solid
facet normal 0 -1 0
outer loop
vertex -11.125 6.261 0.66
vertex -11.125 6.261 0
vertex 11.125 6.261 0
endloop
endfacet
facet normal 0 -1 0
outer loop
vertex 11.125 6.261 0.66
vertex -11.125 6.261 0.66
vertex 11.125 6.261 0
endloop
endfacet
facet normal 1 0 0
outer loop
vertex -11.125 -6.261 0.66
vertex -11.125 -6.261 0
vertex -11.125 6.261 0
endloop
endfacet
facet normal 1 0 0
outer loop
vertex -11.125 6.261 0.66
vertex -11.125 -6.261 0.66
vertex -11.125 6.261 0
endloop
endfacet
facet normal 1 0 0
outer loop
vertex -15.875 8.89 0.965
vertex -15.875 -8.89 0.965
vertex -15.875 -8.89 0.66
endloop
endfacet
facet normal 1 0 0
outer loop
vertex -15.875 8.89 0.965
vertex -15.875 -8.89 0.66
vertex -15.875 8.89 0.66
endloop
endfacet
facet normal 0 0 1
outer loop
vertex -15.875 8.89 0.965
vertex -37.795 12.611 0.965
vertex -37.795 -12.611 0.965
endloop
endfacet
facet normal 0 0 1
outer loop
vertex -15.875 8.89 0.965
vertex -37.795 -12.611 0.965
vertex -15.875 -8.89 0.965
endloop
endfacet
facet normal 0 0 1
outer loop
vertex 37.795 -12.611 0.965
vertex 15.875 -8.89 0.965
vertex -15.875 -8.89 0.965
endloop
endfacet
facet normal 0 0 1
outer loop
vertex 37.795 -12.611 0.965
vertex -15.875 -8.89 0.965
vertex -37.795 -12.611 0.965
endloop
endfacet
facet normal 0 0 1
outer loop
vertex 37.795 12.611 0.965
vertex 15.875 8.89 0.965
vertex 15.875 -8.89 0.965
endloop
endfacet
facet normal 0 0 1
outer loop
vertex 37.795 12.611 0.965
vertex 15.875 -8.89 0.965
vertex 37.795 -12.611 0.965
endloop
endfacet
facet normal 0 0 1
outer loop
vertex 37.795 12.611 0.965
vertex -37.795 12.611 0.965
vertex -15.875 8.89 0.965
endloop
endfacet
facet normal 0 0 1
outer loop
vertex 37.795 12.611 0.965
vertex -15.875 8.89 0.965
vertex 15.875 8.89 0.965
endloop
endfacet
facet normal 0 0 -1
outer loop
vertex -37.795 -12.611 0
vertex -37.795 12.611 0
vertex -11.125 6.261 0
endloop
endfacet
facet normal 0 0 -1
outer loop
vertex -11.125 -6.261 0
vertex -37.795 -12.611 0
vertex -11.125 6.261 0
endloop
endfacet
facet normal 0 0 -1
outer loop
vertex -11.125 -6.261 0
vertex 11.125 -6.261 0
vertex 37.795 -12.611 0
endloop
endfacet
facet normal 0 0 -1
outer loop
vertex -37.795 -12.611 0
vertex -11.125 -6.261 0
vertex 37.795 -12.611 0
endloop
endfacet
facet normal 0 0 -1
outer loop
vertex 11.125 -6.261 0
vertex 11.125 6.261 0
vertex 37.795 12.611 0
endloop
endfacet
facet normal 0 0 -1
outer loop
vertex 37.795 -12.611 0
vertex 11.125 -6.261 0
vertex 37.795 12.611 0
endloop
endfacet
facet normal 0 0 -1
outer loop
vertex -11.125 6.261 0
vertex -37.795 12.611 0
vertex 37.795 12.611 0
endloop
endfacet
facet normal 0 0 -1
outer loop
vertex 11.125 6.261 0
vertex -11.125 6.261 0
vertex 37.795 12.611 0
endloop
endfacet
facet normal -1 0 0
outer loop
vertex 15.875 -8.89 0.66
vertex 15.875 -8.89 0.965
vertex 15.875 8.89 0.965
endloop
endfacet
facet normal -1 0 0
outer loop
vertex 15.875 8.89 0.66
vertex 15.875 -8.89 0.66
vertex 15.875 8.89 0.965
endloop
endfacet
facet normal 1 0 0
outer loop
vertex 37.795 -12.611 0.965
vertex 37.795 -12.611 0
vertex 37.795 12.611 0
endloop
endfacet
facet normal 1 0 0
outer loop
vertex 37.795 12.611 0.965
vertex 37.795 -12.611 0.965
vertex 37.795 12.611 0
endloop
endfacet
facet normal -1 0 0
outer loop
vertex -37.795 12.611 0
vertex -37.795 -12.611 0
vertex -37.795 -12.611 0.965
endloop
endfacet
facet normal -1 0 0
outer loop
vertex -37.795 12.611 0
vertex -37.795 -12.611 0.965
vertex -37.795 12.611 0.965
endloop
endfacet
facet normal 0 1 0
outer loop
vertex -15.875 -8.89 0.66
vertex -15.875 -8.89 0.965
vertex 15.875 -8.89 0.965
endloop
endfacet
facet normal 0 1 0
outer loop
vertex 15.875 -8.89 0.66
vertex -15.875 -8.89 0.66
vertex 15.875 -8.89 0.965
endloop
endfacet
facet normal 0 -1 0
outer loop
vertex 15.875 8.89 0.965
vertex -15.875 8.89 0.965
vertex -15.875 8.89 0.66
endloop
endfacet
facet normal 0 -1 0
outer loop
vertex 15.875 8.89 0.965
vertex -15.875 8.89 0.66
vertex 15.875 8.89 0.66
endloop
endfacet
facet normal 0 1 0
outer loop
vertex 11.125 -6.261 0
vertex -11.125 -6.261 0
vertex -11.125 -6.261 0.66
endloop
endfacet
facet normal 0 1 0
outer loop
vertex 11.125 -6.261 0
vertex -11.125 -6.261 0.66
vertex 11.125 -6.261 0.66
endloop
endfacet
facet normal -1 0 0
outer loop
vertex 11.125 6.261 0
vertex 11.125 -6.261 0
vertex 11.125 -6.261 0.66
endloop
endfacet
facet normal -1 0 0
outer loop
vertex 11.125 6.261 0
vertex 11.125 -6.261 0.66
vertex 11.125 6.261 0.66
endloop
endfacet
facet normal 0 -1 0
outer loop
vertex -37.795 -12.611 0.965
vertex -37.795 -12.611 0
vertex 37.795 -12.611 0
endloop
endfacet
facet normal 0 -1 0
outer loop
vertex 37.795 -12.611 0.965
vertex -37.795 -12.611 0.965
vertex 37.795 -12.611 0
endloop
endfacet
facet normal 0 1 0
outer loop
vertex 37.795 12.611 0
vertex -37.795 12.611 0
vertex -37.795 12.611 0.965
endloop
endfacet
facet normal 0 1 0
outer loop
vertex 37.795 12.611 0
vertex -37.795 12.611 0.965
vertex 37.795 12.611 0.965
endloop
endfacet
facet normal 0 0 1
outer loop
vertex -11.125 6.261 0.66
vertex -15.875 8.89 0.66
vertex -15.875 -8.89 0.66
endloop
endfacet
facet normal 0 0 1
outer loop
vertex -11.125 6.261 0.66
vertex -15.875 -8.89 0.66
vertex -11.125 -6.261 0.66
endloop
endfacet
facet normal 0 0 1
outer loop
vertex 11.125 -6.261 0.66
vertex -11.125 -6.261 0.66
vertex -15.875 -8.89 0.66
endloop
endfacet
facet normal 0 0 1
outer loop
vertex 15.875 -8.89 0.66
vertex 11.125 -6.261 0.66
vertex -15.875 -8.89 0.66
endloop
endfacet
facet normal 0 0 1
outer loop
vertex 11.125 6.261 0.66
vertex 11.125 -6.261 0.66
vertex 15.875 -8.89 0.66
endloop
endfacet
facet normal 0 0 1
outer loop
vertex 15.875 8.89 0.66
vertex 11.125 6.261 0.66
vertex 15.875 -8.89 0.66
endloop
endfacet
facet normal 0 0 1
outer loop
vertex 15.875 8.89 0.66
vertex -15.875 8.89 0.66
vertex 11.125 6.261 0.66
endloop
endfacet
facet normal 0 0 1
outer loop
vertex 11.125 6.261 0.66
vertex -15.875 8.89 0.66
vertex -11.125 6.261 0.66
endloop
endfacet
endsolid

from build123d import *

# Parameters (mm, degrees)
F0_W     = 75.5904
F0_H     = 25.2222
F0_W_2   = 22.2504
F0_H_2   = 12.5222
F1_DEPTH = 0.9652
F2_W     = 31.75
F2_H     = 17.78
F3_DEPTH = 0.3048


with BuildPart() as f1:
    # F0 (on Top) → F1 (new body)
    with BuildSketch(Plane.XY):
        Rectangle(F0_W, F0_H)
        Rectangle(F0_W_2, F0_H_2, mode=Mode.SUBTRACT)
    extrude(amount=F1_DEPTH)

    # F2 (on face) → F3 (cut)
    with BuildSketch(Plane.XY.offset(0.9652)):
        Rectangle(F2_W, F2_H)
    extrude(amount=-F3_DEPTH, mode=Mode.SUBTRACT)


solid = f1.part
